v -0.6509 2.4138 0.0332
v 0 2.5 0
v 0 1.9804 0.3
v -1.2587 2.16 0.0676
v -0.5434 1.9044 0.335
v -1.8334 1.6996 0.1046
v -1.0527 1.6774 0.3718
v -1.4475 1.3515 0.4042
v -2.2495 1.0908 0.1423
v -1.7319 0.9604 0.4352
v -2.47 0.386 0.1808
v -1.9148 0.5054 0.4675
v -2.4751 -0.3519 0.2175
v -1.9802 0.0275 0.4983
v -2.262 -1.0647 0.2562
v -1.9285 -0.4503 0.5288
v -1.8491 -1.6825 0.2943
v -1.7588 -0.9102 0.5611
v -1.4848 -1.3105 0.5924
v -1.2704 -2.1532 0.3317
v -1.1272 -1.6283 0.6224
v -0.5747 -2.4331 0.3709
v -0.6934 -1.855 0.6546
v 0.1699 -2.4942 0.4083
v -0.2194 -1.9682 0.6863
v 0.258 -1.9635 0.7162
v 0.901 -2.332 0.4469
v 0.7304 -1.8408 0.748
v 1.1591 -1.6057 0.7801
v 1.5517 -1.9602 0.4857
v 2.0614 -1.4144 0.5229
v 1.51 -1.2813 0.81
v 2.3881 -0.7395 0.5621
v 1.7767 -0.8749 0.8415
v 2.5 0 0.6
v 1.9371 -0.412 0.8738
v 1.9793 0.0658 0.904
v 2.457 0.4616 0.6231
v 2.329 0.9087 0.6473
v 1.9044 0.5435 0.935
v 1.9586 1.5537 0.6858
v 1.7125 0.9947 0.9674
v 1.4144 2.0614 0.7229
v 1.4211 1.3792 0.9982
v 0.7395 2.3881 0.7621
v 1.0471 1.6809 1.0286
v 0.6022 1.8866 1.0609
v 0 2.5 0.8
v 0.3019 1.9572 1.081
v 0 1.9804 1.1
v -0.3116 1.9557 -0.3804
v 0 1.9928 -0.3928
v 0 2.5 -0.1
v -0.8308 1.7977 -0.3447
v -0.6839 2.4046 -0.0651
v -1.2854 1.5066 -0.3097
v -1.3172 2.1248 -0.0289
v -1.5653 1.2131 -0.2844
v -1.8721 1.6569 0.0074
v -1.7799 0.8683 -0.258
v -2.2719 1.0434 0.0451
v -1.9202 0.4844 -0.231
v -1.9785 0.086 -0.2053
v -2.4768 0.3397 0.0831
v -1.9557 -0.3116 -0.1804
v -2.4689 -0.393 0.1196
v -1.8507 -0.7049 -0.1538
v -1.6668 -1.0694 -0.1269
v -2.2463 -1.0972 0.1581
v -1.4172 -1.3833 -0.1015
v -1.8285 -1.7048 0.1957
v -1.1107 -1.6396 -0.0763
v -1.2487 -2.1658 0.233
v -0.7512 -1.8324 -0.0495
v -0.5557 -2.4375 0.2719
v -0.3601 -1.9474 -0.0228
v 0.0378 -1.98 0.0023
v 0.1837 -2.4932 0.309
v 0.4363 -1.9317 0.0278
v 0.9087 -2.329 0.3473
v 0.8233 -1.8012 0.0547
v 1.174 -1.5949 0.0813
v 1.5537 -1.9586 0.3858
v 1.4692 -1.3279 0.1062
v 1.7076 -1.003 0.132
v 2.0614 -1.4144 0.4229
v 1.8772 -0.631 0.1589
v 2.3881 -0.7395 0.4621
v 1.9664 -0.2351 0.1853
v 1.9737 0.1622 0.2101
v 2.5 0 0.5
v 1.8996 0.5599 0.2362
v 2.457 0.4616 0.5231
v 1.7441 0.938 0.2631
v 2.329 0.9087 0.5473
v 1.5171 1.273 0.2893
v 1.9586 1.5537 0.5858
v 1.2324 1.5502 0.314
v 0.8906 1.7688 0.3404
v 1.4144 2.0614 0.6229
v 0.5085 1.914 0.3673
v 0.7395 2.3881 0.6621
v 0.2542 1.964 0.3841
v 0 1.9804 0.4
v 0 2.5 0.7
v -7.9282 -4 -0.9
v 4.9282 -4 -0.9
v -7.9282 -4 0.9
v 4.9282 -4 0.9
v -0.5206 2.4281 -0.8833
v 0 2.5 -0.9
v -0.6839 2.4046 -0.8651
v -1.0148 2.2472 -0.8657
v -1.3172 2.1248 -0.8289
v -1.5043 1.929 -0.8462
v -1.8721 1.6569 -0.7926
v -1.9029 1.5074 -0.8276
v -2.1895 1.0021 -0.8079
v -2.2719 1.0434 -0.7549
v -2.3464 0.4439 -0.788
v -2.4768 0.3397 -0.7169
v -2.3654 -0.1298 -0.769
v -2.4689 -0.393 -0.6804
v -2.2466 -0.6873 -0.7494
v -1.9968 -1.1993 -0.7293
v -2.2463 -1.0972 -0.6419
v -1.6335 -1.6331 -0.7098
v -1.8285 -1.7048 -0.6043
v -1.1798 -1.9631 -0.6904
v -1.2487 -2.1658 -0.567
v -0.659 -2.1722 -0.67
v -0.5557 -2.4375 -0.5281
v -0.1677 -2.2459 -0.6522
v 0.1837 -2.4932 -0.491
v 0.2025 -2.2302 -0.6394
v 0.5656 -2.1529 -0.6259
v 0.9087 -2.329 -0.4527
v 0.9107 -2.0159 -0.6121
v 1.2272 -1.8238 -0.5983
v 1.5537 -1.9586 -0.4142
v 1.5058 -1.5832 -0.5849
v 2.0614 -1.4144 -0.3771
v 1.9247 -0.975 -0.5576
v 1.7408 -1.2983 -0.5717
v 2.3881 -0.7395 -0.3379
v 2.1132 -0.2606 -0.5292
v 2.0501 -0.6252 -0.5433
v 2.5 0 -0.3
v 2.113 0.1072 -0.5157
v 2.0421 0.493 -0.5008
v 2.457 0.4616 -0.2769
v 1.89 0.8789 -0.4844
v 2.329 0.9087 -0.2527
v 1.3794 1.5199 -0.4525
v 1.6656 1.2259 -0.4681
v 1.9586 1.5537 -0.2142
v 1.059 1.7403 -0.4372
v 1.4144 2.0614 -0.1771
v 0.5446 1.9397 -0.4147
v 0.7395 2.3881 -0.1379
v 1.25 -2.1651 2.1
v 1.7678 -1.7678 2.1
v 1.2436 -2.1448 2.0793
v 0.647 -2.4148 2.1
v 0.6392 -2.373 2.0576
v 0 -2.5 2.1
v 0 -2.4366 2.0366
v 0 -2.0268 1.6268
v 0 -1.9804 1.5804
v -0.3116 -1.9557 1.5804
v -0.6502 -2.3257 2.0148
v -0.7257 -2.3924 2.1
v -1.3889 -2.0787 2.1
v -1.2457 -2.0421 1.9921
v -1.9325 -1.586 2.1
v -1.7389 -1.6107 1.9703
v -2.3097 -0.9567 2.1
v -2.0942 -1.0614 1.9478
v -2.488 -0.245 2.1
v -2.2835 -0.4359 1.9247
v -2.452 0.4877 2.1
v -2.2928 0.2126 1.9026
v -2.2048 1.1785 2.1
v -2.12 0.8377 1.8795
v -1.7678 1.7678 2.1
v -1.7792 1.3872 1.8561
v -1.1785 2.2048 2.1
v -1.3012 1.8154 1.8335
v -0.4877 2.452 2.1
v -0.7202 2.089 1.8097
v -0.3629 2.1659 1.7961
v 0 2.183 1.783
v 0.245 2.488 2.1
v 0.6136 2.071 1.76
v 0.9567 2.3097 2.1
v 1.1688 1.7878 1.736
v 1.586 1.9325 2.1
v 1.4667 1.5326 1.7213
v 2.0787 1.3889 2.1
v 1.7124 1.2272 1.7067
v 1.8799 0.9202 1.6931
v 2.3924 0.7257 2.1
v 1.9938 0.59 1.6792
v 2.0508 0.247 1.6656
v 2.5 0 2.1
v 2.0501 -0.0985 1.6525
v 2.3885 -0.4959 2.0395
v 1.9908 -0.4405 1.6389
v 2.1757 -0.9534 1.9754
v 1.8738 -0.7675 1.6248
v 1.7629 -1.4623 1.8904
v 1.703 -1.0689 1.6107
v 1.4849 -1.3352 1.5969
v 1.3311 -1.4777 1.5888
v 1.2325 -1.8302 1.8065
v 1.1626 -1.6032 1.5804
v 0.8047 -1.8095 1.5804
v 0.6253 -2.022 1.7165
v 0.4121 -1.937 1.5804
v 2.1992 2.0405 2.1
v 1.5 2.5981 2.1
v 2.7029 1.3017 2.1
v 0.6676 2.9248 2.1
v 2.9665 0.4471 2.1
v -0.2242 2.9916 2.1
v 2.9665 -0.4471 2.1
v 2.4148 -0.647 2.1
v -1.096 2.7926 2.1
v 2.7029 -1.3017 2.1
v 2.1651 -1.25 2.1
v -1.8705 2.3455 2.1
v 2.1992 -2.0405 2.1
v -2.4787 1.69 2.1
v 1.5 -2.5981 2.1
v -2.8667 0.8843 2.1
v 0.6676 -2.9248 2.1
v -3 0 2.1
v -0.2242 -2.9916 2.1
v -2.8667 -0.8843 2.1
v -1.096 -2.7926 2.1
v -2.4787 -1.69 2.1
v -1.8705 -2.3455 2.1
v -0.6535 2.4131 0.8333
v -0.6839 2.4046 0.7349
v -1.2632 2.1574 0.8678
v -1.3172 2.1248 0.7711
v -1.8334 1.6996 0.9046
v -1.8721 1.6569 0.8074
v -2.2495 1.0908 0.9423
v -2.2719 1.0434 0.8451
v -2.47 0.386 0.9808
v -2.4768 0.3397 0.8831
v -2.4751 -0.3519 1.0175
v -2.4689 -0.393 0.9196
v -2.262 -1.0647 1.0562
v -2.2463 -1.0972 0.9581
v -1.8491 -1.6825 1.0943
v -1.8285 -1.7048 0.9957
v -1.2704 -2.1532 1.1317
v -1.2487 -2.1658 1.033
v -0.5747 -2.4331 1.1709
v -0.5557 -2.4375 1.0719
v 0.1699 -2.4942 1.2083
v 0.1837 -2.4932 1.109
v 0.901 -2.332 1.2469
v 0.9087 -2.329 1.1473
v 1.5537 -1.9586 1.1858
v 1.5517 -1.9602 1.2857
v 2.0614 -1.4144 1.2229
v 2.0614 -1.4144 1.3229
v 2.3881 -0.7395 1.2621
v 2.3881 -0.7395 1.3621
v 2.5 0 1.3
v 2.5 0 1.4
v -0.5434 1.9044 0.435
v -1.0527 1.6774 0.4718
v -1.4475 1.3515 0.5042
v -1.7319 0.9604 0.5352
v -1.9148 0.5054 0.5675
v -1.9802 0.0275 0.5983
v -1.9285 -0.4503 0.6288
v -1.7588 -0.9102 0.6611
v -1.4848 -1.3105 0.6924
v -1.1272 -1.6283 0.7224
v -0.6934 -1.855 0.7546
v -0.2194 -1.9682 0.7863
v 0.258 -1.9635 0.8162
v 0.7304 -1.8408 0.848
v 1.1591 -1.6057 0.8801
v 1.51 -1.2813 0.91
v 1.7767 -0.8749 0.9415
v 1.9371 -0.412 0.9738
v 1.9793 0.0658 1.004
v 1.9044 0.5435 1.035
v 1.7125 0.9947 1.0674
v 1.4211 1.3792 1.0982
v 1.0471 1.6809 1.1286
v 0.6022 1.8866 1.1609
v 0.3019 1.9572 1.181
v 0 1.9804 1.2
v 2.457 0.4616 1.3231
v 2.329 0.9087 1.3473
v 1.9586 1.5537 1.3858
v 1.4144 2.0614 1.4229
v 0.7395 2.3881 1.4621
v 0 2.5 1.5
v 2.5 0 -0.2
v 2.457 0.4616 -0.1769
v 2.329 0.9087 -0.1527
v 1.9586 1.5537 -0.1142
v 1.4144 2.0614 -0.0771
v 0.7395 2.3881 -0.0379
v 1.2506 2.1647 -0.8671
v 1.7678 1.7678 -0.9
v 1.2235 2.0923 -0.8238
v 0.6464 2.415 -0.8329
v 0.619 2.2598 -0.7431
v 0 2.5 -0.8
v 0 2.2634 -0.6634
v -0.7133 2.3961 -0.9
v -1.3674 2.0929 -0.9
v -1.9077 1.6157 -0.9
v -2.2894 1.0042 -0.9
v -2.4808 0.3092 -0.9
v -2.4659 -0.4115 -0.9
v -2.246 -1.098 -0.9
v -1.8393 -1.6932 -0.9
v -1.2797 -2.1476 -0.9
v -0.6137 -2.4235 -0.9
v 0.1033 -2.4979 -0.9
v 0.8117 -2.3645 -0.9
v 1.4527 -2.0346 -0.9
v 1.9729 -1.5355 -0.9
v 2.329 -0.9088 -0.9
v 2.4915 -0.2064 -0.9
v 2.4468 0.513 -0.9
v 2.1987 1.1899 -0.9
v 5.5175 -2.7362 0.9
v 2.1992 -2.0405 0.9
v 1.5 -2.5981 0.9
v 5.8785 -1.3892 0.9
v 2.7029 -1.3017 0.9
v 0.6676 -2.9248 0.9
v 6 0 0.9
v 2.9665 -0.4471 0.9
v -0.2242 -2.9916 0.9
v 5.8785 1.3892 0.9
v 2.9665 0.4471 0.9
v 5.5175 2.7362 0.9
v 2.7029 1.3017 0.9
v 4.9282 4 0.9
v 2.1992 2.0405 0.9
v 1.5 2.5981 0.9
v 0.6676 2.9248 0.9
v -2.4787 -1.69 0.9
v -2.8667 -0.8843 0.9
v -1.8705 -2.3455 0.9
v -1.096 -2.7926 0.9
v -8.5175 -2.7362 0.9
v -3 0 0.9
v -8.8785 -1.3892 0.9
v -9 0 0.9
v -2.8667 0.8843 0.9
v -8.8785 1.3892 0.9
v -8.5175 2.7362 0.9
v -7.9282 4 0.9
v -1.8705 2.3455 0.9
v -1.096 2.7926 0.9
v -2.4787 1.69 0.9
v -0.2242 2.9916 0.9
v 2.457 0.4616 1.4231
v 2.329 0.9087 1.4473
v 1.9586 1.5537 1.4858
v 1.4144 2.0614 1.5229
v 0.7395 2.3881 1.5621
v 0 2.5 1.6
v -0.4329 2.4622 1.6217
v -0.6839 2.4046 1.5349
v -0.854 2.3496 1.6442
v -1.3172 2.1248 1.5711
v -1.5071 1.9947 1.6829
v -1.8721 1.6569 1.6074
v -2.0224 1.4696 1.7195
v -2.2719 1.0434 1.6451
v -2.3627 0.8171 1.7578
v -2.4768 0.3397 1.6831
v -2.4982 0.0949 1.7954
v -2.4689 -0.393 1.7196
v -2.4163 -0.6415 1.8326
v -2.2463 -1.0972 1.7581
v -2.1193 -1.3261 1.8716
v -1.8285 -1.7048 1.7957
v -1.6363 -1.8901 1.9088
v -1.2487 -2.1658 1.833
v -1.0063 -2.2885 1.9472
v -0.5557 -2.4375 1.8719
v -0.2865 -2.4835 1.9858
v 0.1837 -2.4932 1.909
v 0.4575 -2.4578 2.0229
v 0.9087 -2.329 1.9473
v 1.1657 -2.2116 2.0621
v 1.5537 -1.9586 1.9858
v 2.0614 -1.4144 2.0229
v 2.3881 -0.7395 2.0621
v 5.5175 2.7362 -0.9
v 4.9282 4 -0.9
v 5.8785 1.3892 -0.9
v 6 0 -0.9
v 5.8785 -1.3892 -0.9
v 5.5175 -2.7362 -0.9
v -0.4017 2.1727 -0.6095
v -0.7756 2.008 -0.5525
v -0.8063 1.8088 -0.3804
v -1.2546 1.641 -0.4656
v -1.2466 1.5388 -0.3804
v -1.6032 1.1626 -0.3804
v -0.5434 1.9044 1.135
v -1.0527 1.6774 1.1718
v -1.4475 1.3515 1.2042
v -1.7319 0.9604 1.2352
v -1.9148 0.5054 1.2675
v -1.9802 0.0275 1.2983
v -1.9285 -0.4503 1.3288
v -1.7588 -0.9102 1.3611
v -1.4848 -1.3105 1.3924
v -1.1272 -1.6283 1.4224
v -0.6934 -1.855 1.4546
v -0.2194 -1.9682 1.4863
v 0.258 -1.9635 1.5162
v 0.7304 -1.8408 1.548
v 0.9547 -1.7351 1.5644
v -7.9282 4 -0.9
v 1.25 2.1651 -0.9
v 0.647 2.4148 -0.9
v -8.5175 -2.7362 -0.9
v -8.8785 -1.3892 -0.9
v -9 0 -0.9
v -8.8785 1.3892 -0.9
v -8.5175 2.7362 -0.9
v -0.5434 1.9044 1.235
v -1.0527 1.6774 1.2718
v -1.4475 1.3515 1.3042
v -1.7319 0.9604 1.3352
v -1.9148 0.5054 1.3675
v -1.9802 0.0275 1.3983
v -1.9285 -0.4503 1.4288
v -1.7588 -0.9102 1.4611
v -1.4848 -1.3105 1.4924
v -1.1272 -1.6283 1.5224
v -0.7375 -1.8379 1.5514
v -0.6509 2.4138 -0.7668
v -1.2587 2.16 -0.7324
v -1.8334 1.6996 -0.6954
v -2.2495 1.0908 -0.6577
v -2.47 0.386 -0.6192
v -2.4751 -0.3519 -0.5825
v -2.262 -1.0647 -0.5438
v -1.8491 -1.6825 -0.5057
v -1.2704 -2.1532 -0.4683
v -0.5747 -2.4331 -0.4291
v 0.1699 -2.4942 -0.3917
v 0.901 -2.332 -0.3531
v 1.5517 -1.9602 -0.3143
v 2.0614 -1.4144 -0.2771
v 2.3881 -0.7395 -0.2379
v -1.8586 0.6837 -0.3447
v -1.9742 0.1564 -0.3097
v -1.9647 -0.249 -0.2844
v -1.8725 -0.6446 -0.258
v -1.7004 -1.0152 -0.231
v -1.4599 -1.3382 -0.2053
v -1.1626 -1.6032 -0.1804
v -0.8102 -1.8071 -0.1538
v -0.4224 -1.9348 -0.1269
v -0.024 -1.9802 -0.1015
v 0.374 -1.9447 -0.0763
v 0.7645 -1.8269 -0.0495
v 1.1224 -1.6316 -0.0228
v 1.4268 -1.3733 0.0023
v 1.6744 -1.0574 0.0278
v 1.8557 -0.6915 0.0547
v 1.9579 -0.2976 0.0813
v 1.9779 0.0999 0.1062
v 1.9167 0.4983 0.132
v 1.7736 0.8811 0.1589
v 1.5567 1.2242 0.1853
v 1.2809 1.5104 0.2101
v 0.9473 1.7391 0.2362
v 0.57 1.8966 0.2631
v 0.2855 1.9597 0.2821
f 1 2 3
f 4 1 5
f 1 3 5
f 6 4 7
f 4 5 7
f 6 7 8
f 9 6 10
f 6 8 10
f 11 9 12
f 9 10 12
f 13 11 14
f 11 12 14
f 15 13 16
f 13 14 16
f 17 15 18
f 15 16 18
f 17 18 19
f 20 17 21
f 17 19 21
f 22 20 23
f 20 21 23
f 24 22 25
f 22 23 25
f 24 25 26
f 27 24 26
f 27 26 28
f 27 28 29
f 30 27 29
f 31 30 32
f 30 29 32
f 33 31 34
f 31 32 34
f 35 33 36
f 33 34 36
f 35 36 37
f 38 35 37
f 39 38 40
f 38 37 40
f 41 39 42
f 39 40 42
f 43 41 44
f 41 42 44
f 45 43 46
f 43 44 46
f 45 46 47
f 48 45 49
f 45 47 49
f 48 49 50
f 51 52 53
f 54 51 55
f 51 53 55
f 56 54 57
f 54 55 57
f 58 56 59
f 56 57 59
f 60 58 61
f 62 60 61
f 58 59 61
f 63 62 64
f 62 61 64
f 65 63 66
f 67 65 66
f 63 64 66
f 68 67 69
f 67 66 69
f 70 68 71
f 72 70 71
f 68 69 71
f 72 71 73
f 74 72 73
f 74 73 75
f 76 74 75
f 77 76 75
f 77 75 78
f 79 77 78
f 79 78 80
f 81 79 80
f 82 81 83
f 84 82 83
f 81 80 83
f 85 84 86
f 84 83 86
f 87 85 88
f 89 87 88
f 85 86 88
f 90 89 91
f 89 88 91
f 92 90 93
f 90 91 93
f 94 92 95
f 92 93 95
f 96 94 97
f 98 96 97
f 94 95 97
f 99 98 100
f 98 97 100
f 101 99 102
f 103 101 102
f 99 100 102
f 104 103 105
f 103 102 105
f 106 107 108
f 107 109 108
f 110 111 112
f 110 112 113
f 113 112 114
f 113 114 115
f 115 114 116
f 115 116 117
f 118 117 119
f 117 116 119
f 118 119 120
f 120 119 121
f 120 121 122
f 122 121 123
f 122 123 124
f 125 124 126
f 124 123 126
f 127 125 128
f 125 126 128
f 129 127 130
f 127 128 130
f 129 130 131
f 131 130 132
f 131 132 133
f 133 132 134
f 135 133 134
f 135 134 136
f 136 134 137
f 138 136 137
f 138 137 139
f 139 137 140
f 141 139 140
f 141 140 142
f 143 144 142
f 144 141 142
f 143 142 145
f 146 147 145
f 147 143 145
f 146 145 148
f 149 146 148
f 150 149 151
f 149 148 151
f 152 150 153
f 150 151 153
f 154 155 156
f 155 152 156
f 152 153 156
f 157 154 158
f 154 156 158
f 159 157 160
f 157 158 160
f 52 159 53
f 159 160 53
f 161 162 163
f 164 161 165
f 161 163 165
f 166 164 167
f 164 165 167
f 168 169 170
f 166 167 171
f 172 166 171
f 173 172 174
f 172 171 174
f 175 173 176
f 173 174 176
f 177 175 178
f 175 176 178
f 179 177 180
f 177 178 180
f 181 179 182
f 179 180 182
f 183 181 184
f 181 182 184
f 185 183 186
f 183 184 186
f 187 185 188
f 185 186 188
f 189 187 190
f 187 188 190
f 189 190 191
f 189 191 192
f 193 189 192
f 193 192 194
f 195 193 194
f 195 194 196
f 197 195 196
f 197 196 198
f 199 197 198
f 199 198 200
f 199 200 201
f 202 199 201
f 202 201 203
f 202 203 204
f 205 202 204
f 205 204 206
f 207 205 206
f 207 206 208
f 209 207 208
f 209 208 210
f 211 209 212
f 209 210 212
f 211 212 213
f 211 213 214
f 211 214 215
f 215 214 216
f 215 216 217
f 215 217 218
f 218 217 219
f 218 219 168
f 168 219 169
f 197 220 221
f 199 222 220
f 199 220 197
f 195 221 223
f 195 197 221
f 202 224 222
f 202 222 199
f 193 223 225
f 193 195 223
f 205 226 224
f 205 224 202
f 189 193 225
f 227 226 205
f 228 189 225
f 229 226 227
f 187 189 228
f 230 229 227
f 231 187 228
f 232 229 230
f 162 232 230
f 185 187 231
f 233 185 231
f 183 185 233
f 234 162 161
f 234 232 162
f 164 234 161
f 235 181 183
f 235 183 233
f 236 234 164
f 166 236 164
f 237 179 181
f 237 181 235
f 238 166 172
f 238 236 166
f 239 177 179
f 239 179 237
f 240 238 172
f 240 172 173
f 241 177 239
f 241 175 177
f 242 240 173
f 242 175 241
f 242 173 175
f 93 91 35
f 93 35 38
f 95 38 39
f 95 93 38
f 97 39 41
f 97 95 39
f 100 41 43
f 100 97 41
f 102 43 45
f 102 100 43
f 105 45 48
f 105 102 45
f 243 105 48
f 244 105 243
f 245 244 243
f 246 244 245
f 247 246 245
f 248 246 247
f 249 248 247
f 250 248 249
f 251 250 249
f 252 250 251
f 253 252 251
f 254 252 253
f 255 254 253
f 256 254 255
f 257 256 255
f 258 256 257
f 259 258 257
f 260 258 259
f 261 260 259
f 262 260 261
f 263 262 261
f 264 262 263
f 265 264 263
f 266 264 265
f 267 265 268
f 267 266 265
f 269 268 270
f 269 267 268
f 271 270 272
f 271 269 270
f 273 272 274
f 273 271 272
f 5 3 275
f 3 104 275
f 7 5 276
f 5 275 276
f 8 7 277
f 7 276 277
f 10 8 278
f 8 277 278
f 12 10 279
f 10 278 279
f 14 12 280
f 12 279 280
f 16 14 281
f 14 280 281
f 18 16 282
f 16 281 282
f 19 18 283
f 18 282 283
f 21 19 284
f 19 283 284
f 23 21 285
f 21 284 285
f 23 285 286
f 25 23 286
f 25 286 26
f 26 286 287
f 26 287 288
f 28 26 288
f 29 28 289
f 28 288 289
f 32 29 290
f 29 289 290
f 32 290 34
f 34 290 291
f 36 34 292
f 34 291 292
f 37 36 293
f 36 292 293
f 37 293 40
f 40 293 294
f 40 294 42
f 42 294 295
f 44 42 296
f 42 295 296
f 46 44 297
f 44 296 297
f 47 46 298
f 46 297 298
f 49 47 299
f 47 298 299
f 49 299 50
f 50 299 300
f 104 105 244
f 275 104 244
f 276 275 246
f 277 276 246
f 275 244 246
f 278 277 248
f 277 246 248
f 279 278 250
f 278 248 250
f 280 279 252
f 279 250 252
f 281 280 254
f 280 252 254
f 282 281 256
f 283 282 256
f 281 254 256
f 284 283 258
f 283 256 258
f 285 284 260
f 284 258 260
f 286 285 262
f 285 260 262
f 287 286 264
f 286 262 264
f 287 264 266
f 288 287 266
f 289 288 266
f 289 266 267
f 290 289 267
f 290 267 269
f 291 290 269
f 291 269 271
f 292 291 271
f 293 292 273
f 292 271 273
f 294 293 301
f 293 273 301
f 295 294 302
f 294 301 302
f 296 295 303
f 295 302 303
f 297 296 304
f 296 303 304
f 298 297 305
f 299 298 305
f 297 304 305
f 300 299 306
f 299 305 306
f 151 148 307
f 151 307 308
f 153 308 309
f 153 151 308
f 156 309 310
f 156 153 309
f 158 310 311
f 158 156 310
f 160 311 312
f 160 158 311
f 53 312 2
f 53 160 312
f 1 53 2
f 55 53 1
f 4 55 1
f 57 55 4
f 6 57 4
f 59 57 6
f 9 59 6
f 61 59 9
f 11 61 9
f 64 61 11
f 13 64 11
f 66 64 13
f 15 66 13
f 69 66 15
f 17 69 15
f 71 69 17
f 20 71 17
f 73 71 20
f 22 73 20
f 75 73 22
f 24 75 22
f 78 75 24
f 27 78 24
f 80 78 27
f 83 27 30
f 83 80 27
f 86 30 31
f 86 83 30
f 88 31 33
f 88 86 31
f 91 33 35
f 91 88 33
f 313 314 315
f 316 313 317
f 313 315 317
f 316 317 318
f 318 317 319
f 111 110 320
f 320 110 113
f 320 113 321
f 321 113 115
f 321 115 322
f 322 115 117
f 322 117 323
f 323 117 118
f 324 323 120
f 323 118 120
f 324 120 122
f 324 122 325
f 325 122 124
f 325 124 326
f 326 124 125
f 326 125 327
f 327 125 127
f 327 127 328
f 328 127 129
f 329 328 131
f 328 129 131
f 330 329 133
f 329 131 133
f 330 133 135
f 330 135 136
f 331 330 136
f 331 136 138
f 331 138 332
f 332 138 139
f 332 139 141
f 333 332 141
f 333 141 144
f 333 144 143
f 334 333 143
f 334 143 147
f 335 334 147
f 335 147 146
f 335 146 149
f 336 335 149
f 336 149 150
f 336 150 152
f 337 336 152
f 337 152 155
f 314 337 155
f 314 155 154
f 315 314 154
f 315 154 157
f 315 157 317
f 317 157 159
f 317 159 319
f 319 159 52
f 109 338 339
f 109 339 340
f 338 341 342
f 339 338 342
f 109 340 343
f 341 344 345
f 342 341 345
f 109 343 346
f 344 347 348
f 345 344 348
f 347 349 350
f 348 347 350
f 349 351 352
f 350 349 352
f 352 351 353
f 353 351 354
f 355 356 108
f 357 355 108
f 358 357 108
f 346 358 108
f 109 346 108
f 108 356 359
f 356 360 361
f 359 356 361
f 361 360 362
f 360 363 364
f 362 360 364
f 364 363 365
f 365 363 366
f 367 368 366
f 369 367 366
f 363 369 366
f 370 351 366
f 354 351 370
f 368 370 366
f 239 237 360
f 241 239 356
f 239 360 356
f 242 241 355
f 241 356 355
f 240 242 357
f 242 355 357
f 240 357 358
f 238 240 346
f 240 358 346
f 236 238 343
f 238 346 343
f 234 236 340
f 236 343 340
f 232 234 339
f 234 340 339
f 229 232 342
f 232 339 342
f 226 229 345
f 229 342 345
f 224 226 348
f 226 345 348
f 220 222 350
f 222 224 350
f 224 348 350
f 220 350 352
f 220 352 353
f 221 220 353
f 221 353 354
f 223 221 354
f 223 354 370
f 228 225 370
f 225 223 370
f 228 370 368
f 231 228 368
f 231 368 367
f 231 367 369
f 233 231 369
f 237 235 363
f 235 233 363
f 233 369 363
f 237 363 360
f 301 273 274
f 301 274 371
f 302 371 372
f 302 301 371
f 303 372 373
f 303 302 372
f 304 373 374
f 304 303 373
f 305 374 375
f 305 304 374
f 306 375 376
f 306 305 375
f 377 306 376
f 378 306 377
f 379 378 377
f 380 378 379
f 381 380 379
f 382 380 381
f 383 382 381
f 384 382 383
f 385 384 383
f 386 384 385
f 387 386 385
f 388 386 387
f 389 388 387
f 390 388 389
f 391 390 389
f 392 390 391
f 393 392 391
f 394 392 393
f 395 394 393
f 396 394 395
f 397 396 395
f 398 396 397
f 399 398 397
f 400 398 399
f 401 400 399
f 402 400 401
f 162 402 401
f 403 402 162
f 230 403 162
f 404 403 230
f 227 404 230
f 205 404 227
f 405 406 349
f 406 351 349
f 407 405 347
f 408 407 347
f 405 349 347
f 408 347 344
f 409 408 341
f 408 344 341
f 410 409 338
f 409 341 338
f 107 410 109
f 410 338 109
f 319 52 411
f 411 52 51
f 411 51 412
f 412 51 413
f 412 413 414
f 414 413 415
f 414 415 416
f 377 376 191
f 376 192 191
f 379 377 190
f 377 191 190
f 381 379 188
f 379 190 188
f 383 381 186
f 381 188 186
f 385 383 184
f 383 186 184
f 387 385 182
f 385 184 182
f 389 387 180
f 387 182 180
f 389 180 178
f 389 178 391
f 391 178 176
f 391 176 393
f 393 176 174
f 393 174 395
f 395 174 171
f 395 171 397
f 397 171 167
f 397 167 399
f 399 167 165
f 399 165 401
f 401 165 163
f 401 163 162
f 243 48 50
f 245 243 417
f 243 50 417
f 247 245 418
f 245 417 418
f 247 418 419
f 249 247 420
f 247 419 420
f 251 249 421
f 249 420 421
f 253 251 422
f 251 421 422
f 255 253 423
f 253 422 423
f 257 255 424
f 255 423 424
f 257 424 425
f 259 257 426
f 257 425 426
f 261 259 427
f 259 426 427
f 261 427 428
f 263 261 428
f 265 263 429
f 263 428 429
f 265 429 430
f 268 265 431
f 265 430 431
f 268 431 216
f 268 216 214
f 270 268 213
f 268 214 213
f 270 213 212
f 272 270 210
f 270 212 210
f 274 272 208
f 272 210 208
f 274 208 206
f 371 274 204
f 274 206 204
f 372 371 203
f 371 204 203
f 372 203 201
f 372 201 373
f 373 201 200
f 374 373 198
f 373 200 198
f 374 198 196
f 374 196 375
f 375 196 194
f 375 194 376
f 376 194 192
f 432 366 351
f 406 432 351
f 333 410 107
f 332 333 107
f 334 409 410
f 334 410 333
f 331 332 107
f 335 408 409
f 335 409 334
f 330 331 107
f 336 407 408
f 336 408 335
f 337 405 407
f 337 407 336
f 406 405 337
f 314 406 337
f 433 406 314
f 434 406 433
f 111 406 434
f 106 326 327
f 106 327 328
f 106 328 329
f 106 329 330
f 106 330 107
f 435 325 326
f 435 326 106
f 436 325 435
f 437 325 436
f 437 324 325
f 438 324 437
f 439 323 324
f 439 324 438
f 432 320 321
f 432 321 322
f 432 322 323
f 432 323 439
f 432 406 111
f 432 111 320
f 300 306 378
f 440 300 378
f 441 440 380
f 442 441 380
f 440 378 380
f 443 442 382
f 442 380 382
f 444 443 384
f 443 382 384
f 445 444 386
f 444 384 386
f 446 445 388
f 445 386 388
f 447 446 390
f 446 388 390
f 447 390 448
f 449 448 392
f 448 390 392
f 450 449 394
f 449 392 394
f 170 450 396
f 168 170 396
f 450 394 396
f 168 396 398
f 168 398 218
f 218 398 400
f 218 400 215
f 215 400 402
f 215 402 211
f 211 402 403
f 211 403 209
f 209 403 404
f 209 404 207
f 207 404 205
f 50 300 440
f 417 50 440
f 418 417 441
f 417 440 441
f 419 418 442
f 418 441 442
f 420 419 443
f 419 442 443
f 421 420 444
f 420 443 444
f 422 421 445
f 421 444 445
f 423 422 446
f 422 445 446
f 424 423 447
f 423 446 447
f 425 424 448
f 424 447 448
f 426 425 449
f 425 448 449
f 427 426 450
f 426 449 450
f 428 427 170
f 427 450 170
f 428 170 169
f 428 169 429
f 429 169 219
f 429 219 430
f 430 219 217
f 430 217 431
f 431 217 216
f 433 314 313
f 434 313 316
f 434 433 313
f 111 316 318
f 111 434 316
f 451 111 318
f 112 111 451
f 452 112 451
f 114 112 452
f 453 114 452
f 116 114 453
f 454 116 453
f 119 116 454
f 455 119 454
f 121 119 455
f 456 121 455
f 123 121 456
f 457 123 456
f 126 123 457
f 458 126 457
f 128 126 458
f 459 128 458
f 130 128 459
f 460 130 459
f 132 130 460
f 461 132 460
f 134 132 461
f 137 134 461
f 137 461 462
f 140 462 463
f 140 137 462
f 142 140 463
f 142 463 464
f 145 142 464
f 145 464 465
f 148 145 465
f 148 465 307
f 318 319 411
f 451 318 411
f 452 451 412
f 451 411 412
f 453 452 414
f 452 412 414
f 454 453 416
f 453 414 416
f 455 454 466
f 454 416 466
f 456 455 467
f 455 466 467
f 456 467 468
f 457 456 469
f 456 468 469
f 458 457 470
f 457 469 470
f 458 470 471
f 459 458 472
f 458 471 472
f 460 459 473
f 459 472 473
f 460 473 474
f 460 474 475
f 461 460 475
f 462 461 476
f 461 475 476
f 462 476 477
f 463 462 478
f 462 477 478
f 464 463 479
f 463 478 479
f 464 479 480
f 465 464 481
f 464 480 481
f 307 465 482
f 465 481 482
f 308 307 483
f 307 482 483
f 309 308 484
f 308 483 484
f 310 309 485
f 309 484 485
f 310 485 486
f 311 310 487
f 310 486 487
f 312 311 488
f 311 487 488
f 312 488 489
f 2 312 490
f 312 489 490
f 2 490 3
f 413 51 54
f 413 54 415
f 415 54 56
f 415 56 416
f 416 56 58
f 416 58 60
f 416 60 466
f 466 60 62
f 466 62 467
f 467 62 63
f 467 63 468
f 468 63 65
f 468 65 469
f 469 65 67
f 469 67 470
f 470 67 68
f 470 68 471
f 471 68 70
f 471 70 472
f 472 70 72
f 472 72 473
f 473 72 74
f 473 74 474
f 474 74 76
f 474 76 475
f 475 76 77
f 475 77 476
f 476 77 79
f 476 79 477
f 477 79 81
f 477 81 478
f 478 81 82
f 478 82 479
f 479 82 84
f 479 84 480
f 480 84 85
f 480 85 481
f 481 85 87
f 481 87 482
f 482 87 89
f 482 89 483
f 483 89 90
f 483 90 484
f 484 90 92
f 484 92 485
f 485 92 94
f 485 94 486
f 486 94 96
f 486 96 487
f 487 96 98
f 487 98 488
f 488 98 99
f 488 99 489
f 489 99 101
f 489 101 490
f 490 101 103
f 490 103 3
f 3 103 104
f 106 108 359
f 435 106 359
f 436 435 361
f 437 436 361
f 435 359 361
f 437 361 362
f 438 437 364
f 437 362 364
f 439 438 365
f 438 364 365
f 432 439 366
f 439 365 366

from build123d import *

# Parameters (mm, degrees)
BOSS_EXTRUDE1_DEPTH     = 0.9
SKETCH8_R               = 3
SKETCH8_R_2             = 2.5
BOSS_EXTRUDE2_DEPTH     = 1.2
CUT_EXTRUDE1_DEPTH      = 11.070253224
CUT_EXTRUDE1_DEPTH_BACK = 11.070253224
SKETCH1_R               = 2.5
SWEEP1_PITCH            = 0.8
SPLIT1_START            = -3.0000001
SPLIT1_OUTLINE_W        = 8
SPLIT1_OUTLINE_H        = 2.1
SPLIT1_OUTLINE_H_2      = 1.9
SPLIT1_DEPTH            = 6.0000002


with BuildPart() as part:
    # Sketch7 → Boss-Extrude1 (new, symmetric)
    with BuildSketch(Plane.XY):
        with BuildLine():
            Line((-7.92820323, 4), (4.92820323, 4))
            ThreePointArc((4.92820323, 4), (6, 0), (4.92820323, -4))
            Line((4.92820323, -4), (-7.92820323, -4))
            ThreePointArc((-7.92820323, -4), (-9, 0), (-7.92820323, 4))
        make_face()
    extrude(amount=BOSS_EXTRUDE1_DEPTH, both=True)

    # Sketch8 → Boss-Extrude2 (add)
    with BuildSketch(Plane.XY.offset(0.9)):
        with Locations(Location((0, 0, 0), (0, 0, 180))):
            Circle(SKETCH8_R)
        Circle(SKETCH8_R_2, mode=Mode.SUBTRACT)
    extrude(amount=BOSS_EXTRUDE2_DEPTH)

    # Sketch1 → Cut-Extrude1 (cut, two sides: drawn at the far end of the back side and taken through both)
    with BuildSketch(Plane.XY.offset(-CUT_EXTRUDE1_DEPTH_BACK)):
        Circle(SKETCH1_R)
    extrude(amount=CUT_EXTRUDE1_DEPTH + CUT_EXTRUDE1_DEPTH_BACK, mode=Mode.SUBTRACT)

    # Sweep1: arcs per turn and ends read off the stored shape
    # Sweep1: the profile of Sketch3 screwed along a right-hand helix through 4.75 turns, 8 arcs to a turn; built about Z, then put on its axis
    sweep1_z = Axis((0, 0, 0), (0, 0, 1))
    sweep1_corners = [(2.54330127, 0, 0.025), (2.54330127, 0, -0.725), (1.980384758, 0, -0.4), (1.980384758, 0, -0.3)]
    with BuildLine(mode=Mode.PRIVATE) as sweep1_profile:
        Line(sweep1_corners[0], sweep1_corners[1])
        Line(sweep1_corners[1], sweep1_corners[2])
        Line(sweep1_corners[2], sweep1_corners[3])
        Line(sweep1_corners[3], sweep1_corners[0])
    sweep1_cap = Face(sweep1_profile.wire())
    sweep1_turn_angles = [0, 22.5, 45, 67.5, 90, 112.5, 135, 157.5, 180, 202.5, 225, 247.5, 270, 292.5, 315, 337.5, 360]
    sweep1_turn_weights = [1, 0.9238795325112867, 1, 0.9238795325112867, 1, 0.9238795325112867, 1, 0.9238795325112867, 1, 0.9238795325112867, 1, 0.9238795325112867, 1, 0.9238795325112867, 1, 0.9238795325112867, 1]
    sweep1_turn_rails = [Edge.make_bspline([Vector(p[0], p[1], 0).rotate(sweep1_z, sweep1_turn_angles[k]) / sweep1_turn_weights[k] + Vector(0, 0, p[2] + SWEEP1_PITCH * sweep1_turn_angles[k] / 360) for k in range(17)], [0, 0, 0, 1, 1, 2, 2, 3, 3, 4, 4, 5, 5, 6, 6, 7, 7, 8, 8, 8], 2, sweep1_turn_weights) for p in sweep1_corners]
    sweep1_turn_sides = [Face.make_surface_from_curves(sweep1_turn_rails[p[0]], sweep1_turn_rails[p[1]]) for p in [(0, 1), (1, 2), (2, 3), (3, 0)]]
    sweep1_last_angles = [1440, 1462.5, 1485, 1507.5, 1530, 1552.5, 1575, 1597.5, 1620, 1642.5, 1665, 1687.5, 1710]
    sweep1_last_weights = [1, 0.9238795325112867, 1, 0.9238795325112867, 1, 0.9238795325112867, 1, 0.9238795325112867, 1, 0.9238795325112867, 1, 0.9238795325112776, 1]
    sweep1_last_rails = [Edge.make_bspline([Vector(p[0], p[1], 0).rotate(sweep1_z, sweep1_last_angles[k]) / sweep1_last_weights[k] + Vector(0, 0, p[2] + SWEEP1_PITCH * sweep1_last_angles[k] / 360) for k in range(13)], [0, 0, 0, 1, 1, 2, 2, 3, 3, 4, 4, 5, 5, 6, 6, 6], 2, sweep1_last_weights) for p in sweep1_corners]
    sweep1_last_sides = [Face.make_surface_from_curves(sweep1_last_rails[p[0]], sweep1_last_rails[p[1]]) for p in [(0, 1), (1, 2), (2, 3), (3, 0)]]
    sweep1 = Plane(origin=(0, 0, -0.9), x_dir=(0, 1, 0), z_dir=(0, 0, 1)) * Solid(Shell([*[p.moved(Location((0, 0, SWEEP1_PITCH * i))) for i in range(4) for p in sweep1_turn_sides], *sweep1_last_sides, sweep1_cap, sweep1_cap.rotate(sweep1_z, 1710).moved(Location((0, 0, SWEEP1_PITCH * 1710 / 360)))]))
    add(sweep1)

    # Split1: read off the stored shape, not the designer's step
    # Split1 outline → Split1 (cut)
    with BuildSketch(Plane(origin=(0, 0, 0), x_dir=(1, 0, 0), z_dir=(0, 1, 0)).offset(SPLIT1_START)):
        with Locations((0, 1.95)):
            Rectangle(SPLIT1_OUTLINE_W, SPLIT1_OUTLINE_H)
        with Locations((0, -3.05)):
            Rectangle(SPLIT1_OUTLINE_W, SPLIT1_OUTLINE_H_2)
    extrude(amount=SPLIT1_DEPTH, mode=Mode.SUBTRACT)

    # Cut-Extrude2 cone 1 section (through the dimple's axis) → Cut-Extrude2 (revolve, cut)
    with BuildSketch(Plane(origin=(0, 0, -0.9), x_dir=(0, 1, 0), z_dir=(1, 0, 0))):
        Polygon((0, 0), (2.5, 0), (0, 2.5), align=None)
    revolve(axis=Axis((0, 0, -0.9), (0, 0, 1)), mode=Mode.SUBTRACT)

    # Cut-Extrude3 cone 1 section (through the dimple's axis) → Cut-Extrude3 (revolve, cut)
    with BuildSketch(Plane(origin=(0, 0, 2.1), x_dir=(0, -1, 0), z_dir=(1, 0, 0))):
        Polygon((0, 0), (2.5, 0), (0, 2.5), align=None)
    revolve(axis=Axis((0, 0, 2.1), (0, 0, -1)), mode=Mode.SUBTRACT)


solid = part.part
